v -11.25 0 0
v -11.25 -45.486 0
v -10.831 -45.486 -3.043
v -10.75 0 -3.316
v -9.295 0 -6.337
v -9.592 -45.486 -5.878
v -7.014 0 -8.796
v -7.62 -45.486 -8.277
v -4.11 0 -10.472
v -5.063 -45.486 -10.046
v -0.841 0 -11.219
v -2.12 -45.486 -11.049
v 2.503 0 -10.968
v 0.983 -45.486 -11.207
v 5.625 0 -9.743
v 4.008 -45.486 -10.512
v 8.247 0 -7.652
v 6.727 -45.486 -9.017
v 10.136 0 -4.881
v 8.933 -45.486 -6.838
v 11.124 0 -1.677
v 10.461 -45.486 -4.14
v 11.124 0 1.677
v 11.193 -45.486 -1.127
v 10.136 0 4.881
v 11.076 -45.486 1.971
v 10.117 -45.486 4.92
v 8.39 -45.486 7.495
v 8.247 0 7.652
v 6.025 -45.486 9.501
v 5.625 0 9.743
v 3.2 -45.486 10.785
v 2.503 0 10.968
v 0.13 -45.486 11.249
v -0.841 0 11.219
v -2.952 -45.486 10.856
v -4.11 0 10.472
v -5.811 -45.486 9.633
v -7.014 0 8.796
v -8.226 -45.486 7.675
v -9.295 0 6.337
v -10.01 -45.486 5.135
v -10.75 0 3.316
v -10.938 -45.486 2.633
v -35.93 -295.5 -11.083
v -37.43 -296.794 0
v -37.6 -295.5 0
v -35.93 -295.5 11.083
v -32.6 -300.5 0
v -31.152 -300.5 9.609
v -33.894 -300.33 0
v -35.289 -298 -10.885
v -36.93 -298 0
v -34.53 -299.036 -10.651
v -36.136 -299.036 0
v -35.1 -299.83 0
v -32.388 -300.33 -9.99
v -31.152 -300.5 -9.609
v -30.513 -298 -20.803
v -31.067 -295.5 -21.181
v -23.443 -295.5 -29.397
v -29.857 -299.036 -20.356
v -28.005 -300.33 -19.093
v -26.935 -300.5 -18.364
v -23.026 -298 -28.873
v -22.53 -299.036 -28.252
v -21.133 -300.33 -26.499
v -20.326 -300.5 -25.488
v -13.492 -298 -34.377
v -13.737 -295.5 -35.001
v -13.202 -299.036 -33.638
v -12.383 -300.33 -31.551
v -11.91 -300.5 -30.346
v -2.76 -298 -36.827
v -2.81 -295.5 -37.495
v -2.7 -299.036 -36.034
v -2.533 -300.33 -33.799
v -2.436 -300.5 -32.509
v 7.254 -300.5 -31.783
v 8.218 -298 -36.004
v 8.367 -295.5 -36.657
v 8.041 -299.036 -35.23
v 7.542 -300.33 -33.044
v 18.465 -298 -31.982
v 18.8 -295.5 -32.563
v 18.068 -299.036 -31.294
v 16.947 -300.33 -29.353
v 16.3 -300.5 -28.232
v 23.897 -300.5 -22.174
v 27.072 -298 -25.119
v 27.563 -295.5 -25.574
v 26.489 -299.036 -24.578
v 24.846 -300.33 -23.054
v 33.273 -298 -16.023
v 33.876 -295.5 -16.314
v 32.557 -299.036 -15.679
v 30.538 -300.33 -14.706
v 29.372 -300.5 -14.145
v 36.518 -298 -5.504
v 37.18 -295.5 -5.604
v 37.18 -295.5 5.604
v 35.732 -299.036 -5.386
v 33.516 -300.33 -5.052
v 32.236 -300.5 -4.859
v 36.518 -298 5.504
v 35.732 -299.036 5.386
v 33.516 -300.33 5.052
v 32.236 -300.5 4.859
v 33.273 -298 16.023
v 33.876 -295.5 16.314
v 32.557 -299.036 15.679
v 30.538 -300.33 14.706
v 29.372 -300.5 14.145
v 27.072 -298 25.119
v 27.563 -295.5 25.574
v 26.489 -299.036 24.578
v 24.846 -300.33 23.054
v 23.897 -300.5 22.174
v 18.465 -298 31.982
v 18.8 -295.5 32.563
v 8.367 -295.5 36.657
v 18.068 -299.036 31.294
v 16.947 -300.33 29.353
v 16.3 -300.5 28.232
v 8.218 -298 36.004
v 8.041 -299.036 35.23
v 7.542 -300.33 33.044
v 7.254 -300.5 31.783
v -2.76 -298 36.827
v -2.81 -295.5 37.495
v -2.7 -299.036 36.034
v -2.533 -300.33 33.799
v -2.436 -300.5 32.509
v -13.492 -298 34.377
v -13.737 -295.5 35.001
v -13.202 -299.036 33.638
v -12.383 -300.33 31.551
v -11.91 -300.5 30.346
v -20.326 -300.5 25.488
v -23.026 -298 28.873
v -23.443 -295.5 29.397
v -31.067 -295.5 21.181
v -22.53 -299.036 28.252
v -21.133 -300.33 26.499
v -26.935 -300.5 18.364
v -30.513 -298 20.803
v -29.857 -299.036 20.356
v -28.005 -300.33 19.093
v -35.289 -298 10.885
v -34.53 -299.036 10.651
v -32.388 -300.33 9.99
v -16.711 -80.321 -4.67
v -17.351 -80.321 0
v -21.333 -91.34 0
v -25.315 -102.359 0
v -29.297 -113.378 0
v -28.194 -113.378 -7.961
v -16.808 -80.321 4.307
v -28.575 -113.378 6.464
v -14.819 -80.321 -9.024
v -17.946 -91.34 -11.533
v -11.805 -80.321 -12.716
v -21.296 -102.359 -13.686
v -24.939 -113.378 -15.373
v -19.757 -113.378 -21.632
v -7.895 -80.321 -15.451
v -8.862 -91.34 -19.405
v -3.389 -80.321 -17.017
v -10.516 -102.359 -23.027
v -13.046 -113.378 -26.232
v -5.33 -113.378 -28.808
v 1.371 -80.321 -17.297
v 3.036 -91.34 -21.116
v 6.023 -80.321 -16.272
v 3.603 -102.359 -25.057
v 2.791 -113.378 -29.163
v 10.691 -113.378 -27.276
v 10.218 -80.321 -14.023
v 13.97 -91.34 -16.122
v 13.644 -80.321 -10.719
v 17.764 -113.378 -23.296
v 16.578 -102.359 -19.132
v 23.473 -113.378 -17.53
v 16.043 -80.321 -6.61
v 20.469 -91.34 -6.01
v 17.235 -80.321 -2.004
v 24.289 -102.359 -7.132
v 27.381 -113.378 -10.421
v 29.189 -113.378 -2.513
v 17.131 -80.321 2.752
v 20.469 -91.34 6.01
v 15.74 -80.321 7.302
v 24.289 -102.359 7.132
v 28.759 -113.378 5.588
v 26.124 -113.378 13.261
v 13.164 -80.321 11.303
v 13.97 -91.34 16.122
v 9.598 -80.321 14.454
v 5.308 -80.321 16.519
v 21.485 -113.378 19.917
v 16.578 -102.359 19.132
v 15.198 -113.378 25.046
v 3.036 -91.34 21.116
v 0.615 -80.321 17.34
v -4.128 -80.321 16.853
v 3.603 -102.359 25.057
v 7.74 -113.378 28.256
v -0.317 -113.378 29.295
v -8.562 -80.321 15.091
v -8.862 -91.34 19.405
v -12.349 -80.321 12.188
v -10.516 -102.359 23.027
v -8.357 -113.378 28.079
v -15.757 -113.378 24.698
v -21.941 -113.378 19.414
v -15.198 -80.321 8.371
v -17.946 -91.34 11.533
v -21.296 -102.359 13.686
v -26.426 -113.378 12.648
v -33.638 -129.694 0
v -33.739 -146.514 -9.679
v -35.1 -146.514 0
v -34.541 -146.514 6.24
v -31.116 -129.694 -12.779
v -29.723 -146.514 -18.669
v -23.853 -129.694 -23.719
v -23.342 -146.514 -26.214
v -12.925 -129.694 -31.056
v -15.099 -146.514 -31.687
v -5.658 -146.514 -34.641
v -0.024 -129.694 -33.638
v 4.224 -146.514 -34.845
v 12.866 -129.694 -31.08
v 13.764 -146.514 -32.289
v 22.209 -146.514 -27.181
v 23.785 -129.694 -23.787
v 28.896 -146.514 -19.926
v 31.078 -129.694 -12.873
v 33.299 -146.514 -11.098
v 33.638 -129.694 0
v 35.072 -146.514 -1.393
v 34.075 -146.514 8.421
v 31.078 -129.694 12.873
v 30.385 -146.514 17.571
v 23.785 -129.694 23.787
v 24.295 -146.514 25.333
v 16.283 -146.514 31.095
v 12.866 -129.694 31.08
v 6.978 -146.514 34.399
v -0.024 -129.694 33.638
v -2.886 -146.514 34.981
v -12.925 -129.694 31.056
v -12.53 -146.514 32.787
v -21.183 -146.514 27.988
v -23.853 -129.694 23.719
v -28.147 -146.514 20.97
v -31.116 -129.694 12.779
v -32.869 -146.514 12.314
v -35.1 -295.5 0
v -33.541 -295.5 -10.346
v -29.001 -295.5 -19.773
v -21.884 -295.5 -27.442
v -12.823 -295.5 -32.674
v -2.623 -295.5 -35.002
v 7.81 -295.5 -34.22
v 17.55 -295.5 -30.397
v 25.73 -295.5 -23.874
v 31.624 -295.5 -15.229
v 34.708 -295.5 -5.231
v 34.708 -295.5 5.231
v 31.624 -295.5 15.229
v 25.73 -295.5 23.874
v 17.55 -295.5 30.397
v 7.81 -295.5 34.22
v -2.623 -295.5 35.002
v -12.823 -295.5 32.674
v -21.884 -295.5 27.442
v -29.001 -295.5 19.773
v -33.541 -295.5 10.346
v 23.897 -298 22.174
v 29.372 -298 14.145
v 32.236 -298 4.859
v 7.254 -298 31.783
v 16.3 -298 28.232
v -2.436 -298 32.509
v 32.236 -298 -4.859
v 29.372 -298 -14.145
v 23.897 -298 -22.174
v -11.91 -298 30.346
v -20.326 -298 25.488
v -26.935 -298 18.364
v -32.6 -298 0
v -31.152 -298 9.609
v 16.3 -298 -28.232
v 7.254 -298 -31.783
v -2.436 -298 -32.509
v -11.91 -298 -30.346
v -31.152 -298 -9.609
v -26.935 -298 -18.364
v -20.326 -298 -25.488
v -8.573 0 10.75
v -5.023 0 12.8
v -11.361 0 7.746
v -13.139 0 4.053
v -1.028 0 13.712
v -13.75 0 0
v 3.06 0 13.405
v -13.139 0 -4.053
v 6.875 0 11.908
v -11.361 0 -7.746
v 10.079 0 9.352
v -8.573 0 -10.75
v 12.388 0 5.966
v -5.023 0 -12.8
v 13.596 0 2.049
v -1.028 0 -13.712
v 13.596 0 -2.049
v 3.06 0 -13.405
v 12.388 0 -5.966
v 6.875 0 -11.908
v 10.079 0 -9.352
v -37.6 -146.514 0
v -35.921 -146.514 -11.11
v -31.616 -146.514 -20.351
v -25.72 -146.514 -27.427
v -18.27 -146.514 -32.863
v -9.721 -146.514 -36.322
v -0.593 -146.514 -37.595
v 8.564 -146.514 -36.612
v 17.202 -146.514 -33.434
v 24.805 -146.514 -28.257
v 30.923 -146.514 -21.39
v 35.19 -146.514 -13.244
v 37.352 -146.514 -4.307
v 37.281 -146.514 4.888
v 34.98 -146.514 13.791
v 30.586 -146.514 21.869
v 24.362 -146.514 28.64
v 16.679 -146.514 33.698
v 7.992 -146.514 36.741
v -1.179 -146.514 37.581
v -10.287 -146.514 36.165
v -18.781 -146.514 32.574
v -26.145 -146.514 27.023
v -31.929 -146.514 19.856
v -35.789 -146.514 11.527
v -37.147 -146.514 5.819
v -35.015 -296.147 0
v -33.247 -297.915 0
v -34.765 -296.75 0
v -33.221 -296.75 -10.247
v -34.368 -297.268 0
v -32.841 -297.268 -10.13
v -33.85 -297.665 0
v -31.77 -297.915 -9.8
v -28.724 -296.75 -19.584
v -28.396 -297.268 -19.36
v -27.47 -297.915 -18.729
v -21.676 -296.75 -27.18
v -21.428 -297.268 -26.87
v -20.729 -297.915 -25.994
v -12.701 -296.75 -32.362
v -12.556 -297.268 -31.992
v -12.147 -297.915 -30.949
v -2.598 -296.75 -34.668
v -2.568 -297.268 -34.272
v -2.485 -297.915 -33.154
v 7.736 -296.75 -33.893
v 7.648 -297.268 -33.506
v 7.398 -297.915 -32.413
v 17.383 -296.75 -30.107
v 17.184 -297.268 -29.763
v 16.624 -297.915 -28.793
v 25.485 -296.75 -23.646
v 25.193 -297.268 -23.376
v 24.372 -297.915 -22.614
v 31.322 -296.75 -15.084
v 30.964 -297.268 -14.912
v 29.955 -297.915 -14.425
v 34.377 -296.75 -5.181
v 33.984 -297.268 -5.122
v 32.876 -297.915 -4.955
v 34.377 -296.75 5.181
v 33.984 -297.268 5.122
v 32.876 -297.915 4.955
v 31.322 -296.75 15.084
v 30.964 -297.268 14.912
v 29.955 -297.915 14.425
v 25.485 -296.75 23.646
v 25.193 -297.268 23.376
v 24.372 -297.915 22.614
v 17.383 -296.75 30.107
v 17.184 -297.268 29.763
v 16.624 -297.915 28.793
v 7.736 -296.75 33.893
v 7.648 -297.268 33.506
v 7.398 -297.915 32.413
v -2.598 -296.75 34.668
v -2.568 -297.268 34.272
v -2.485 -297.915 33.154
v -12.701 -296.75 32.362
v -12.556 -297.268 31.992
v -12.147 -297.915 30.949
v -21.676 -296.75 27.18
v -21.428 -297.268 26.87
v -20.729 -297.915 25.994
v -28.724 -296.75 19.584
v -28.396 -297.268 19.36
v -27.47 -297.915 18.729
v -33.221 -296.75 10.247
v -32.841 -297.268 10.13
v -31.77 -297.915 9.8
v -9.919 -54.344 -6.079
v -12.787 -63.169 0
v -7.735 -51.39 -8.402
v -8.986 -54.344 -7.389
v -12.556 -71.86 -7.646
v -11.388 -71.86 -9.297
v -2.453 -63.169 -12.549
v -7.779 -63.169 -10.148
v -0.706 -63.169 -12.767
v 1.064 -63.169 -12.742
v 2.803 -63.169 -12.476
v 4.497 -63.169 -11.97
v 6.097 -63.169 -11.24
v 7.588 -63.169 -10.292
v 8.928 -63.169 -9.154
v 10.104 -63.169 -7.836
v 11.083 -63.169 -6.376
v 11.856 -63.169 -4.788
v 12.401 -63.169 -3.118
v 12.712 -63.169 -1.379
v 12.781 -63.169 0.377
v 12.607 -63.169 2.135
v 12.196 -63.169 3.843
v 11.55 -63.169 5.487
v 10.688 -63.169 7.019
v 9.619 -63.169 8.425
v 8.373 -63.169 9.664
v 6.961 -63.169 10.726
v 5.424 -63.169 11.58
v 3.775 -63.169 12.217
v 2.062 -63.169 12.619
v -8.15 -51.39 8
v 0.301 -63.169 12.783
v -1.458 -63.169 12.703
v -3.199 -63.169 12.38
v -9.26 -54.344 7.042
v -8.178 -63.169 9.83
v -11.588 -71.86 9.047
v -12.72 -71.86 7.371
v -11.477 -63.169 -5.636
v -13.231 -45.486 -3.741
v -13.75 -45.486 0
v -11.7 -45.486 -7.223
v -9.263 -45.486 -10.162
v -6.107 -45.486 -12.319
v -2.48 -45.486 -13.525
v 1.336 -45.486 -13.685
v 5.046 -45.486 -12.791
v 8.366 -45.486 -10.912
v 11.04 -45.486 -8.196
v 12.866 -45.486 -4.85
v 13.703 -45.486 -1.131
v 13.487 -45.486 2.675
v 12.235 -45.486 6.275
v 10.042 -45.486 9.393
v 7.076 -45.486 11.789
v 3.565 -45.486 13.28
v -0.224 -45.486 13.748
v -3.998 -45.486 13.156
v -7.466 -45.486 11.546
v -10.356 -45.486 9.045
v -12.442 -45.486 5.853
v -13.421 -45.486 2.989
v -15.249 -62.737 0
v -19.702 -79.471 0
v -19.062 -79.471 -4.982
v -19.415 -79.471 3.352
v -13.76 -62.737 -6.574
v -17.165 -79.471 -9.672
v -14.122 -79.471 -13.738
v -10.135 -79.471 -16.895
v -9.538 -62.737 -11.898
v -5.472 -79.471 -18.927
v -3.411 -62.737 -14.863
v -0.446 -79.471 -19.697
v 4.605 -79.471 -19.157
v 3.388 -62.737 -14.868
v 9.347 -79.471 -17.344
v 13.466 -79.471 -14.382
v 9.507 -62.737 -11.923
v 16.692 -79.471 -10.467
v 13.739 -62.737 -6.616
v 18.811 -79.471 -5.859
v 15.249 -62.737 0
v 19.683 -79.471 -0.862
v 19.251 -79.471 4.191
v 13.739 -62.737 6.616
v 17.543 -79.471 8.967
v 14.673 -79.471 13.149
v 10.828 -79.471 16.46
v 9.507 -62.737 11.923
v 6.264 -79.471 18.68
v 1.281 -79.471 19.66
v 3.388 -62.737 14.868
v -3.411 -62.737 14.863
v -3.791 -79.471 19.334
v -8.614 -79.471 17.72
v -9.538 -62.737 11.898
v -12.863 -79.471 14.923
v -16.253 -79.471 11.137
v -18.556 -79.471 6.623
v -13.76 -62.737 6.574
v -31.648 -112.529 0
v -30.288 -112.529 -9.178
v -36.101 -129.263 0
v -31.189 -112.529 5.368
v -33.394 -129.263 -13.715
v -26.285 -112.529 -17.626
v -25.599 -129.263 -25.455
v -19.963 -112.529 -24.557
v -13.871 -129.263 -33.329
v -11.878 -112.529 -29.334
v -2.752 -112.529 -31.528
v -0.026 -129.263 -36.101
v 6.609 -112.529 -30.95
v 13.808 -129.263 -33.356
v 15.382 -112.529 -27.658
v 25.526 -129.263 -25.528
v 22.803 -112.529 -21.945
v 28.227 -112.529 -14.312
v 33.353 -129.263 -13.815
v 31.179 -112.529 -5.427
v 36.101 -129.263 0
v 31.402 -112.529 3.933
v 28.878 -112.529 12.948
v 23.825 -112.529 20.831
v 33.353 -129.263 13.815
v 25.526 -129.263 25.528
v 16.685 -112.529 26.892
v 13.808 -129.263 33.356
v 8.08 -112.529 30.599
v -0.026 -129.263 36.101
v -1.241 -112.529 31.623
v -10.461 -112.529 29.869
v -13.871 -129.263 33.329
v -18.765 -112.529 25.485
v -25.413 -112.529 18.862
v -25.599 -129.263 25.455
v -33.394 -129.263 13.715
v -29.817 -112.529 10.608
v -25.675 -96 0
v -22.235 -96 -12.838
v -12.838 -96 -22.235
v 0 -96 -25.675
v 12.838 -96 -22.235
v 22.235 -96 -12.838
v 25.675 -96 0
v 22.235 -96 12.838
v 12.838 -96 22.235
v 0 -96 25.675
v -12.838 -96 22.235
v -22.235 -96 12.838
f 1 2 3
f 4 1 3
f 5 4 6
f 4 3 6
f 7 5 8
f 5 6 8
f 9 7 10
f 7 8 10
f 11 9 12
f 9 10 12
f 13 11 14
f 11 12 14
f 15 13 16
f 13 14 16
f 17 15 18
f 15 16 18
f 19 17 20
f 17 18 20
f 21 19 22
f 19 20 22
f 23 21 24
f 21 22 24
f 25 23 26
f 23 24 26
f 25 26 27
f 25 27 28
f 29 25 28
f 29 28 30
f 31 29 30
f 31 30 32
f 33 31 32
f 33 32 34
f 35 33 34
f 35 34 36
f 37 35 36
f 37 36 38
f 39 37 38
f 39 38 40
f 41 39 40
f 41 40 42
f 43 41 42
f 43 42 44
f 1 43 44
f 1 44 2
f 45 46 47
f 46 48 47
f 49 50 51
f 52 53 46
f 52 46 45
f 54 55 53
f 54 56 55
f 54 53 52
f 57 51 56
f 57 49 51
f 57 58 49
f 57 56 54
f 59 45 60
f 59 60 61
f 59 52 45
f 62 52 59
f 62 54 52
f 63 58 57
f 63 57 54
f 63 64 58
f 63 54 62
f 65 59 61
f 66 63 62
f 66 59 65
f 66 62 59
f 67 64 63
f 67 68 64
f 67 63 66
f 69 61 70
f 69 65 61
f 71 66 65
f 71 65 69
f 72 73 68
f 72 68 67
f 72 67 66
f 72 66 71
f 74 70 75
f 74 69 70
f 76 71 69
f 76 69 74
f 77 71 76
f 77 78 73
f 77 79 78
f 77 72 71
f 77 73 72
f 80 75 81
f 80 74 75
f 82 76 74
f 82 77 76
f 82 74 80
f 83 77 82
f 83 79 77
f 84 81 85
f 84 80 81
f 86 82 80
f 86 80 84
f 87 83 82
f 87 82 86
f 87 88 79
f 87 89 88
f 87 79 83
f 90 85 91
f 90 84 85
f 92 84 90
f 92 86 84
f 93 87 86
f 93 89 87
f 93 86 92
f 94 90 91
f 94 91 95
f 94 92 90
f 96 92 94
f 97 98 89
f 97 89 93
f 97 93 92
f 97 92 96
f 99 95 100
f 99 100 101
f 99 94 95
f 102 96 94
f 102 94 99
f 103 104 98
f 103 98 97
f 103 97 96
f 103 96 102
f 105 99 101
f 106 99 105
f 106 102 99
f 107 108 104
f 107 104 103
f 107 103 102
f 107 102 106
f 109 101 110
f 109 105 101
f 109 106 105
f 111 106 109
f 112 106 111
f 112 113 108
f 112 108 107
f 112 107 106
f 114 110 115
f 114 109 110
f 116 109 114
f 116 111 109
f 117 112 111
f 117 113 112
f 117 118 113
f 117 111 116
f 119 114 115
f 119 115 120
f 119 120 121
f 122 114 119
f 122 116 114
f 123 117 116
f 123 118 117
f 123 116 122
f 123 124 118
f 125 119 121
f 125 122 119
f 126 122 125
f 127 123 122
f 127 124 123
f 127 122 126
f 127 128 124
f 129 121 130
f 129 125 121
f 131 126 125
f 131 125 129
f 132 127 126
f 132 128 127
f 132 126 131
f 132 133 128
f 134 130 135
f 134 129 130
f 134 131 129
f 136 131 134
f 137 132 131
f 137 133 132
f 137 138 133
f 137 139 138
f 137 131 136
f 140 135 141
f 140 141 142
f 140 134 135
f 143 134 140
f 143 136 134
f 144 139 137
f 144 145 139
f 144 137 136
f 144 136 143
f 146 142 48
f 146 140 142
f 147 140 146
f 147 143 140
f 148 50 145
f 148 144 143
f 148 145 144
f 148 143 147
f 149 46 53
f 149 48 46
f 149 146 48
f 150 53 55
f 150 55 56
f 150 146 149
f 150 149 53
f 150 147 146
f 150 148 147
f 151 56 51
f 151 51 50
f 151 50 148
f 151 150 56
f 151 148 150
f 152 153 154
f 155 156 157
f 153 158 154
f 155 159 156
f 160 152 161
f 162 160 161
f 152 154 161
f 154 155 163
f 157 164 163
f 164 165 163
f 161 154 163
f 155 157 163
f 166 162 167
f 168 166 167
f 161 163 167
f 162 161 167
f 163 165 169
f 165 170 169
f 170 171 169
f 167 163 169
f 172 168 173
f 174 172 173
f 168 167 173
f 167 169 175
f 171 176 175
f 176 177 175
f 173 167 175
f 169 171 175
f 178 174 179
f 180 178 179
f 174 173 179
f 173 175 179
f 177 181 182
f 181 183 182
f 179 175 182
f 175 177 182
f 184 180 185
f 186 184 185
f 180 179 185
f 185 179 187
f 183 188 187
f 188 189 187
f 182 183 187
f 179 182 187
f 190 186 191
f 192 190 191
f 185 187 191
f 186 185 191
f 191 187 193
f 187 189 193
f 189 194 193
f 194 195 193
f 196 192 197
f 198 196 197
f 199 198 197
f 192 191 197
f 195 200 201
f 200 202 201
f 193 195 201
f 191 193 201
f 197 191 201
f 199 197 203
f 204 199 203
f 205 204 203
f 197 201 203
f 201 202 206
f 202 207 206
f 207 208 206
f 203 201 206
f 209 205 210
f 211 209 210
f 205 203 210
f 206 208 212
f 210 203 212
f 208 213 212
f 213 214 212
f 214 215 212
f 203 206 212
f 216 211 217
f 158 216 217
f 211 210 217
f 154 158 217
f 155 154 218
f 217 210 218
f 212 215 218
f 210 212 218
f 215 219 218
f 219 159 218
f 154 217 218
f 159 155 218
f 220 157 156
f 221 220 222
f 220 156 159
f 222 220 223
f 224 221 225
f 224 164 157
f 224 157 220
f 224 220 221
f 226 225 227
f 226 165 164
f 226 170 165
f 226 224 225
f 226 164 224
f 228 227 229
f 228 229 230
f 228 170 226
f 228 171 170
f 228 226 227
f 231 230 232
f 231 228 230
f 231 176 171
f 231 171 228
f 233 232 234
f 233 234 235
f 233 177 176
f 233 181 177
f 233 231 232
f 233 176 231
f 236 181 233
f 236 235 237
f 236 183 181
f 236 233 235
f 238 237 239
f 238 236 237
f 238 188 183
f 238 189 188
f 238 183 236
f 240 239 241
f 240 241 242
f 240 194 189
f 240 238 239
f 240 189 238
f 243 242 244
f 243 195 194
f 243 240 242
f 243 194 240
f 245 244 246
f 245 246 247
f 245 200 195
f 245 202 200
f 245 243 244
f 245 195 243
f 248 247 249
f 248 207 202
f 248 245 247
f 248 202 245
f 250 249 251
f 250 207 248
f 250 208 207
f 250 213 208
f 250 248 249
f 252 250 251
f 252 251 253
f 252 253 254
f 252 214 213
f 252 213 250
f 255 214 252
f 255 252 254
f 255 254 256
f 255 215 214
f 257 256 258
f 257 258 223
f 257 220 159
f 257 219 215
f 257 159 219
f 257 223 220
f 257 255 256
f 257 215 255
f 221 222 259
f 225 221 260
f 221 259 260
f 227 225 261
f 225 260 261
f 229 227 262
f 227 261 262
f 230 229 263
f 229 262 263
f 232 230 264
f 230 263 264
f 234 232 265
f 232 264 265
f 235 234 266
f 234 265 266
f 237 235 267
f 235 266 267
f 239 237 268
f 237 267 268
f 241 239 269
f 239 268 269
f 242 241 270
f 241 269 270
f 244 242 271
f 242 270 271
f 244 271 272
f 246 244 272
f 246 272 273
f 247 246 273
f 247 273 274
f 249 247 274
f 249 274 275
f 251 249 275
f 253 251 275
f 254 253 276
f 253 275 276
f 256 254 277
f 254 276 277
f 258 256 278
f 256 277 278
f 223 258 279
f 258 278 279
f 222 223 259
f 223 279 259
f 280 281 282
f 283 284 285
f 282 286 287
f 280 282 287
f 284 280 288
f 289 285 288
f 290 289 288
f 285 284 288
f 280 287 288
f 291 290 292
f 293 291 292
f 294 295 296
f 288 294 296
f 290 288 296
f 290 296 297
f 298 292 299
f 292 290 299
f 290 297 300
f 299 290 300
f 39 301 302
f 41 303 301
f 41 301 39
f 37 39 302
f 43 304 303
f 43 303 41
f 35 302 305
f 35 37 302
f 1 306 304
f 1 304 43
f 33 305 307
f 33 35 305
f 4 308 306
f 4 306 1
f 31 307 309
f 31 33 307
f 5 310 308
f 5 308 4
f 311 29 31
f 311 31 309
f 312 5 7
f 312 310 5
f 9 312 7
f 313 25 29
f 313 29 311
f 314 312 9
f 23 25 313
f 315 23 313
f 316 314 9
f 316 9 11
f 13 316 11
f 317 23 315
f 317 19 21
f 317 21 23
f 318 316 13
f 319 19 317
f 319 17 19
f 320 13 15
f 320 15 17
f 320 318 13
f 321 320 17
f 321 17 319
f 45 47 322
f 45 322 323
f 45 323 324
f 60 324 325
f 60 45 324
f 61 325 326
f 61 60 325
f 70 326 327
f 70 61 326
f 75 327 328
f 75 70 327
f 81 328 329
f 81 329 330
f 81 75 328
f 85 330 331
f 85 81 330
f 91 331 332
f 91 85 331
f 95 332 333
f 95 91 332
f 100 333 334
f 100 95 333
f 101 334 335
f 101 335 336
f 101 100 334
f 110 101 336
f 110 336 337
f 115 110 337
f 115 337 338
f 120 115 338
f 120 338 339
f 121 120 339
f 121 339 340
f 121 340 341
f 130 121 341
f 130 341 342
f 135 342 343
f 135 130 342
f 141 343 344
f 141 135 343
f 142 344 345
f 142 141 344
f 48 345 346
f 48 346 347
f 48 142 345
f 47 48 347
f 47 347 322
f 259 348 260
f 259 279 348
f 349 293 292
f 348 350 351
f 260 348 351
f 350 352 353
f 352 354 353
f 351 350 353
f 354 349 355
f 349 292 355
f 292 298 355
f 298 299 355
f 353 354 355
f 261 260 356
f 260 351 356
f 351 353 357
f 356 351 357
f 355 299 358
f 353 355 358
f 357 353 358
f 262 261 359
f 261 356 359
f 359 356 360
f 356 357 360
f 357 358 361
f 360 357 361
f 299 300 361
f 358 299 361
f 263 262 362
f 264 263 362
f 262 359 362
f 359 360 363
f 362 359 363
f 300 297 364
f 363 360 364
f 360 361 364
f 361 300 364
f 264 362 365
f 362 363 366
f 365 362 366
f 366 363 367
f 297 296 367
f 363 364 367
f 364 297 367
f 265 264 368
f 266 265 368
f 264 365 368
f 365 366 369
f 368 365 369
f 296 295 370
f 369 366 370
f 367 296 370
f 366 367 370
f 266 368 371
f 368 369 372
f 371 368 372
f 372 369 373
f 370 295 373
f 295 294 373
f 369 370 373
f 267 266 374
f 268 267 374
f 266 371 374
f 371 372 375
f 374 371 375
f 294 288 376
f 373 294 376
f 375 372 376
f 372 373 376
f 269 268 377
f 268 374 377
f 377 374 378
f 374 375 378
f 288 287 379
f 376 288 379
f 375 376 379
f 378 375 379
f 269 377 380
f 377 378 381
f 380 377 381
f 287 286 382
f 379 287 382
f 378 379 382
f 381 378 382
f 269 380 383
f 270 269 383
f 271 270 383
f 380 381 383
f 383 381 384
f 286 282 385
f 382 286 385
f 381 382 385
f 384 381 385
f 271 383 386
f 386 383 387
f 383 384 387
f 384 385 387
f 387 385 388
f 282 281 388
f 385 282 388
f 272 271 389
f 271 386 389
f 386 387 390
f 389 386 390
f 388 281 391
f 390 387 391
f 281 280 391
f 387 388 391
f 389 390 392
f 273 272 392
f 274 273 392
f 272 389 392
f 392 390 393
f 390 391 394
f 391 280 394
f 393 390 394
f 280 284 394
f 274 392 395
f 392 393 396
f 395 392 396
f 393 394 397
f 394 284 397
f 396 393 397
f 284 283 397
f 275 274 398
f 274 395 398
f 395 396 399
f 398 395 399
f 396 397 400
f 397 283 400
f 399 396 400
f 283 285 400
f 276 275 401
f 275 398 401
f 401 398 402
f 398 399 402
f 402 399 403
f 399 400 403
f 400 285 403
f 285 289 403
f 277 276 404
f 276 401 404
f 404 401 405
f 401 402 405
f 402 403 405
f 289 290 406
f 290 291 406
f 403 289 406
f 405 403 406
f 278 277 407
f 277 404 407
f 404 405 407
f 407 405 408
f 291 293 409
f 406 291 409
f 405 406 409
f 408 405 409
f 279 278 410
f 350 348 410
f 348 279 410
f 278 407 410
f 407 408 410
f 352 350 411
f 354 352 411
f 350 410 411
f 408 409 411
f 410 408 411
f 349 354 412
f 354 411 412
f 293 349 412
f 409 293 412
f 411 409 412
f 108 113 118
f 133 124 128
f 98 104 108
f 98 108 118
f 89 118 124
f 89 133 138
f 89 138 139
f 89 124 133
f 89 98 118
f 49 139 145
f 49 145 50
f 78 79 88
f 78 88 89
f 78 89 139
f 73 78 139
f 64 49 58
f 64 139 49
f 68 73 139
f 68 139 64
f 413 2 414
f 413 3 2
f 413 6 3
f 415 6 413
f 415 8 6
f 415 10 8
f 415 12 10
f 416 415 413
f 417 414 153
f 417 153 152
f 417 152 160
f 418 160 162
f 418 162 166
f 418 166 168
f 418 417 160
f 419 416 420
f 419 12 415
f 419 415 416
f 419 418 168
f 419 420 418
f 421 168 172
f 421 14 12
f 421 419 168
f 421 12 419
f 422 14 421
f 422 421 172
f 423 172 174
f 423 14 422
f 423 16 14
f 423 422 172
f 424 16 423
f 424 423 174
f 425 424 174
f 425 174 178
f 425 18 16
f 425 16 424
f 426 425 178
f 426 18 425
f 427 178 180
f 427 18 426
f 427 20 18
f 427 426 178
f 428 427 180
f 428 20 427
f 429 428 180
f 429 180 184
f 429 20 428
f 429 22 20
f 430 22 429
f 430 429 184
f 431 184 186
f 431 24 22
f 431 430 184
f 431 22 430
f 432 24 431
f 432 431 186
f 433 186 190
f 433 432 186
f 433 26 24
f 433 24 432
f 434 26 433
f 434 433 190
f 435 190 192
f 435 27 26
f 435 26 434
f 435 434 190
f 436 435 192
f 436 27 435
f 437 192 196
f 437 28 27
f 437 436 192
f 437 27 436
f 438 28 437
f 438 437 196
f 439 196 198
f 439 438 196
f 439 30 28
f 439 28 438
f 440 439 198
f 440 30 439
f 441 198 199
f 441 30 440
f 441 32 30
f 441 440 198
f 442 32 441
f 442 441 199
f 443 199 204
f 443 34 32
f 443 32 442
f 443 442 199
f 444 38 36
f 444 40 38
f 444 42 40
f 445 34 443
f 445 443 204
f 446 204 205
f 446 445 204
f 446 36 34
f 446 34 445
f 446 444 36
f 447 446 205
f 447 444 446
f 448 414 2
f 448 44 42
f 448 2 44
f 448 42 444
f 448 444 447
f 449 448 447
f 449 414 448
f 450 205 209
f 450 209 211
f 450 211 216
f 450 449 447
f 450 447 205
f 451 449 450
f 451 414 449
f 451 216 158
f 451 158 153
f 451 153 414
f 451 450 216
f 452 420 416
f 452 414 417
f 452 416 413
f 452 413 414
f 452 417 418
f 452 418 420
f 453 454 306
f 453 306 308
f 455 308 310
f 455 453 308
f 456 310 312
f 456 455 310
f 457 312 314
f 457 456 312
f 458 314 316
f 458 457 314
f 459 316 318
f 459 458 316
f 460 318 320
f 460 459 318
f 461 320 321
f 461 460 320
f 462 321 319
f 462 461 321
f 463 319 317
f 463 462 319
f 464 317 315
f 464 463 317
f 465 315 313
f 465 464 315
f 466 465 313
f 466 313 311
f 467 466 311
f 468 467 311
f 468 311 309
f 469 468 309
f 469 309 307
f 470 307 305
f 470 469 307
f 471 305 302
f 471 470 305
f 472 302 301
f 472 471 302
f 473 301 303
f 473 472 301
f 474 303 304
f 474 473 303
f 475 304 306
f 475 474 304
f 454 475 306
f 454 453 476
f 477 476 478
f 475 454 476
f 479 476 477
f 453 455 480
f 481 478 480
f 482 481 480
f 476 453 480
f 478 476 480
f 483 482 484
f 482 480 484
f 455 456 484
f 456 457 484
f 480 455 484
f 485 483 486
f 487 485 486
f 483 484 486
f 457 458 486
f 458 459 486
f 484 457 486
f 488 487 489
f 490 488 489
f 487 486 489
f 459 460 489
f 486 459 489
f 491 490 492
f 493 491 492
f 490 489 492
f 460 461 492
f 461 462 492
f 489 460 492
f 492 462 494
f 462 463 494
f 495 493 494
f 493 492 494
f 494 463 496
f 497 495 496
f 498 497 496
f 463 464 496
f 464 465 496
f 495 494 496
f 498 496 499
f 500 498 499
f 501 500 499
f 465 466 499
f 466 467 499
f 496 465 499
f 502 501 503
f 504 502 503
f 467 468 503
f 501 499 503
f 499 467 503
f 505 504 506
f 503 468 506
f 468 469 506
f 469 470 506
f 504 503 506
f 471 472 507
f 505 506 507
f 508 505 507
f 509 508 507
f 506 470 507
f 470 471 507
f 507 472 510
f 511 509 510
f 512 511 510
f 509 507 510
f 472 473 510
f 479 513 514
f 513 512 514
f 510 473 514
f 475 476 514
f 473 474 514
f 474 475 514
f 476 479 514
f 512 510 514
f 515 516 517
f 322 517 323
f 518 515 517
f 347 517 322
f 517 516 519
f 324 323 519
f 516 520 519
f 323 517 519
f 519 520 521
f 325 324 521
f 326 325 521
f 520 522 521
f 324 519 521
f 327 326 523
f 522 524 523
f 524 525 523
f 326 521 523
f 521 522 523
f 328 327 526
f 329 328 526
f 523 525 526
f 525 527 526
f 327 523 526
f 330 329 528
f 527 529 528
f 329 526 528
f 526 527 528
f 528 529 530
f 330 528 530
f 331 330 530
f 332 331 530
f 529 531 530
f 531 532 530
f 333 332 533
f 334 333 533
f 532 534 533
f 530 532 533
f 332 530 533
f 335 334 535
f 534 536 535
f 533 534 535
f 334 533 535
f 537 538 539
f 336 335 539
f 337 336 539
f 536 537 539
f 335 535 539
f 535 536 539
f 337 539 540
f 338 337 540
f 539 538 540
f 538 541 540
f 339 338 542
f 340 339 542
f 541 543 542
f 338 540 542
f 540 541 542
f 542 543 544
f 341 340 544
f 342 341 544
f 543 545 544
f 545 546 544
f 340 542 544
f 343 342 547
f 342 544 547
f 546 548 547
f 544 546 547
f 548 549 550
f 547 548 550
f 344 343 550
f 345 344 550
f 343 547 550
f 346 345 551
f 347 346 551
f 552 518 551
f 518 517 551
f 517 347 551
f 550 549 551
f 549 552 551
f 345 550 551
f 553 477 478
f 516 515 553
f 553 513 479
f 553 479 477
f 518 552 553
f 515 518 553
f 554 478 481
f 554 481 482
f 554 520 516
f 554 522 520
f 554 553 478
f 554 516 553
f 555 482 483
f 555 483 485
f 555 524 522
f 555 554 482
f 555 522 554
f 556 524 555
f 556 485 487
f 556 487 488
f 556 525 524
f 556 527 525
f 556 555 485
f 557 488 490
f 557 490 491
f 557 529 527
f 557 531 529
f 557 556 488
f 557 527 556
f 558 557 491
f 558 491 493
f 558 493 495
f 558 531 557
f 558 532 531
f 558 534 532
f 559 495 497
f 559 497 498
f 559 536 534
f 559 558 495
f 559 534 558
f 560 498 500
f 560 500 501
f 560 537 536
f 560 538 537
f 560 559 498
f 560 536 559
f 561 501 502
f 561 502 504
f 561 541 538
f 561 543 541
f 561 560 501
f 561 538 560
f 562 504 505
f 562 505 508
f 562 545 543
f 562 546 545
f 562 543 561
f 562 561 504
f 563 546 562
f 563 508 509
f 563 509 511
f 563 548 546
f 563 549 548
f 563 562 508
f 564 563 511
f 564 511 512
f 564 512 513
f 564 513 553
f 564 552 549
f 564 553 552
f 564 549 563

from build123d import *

# Parameters (mm, degrees)
F2_R = 100
F3_R = 5
F4_T = -2.5


with BuildPart() as f1:
    # F0 (on Top) → F1 (revolve)
    with BuildSketch(Plane.XY):
        Polygon((0, -300.5), (0, 0), (-13.75, 0), (-13.75, -63), (-37.6, -129), (-37.6, -300.5), align=None)
    revolve(axis=Axis((0, -150.25, 0), (0, -1, 0)))

    # F2
    f2_edges = [f1.edges().sort_by_distance(p)[0] for p in [
        (13.75, -63, 0),
        (37.6, -129, 0),
    ]]
    fillet(f2_edges, radius=F2_R)

    # F3
    f3_edges = [f1.edges().sort_by_distance(p)[0] for p in [
        (37.6, -300.5, 0),
    ]]
    fillet(f3_edges, radius=F3_R)

    # F4
    f4_openings = [f1.faces().sort_by_distance(p)[0] for p in [
        (0, 0, 0),
    ]]
    offset(amount=F4_T, openings=f4_openings)


solid = f1.part
